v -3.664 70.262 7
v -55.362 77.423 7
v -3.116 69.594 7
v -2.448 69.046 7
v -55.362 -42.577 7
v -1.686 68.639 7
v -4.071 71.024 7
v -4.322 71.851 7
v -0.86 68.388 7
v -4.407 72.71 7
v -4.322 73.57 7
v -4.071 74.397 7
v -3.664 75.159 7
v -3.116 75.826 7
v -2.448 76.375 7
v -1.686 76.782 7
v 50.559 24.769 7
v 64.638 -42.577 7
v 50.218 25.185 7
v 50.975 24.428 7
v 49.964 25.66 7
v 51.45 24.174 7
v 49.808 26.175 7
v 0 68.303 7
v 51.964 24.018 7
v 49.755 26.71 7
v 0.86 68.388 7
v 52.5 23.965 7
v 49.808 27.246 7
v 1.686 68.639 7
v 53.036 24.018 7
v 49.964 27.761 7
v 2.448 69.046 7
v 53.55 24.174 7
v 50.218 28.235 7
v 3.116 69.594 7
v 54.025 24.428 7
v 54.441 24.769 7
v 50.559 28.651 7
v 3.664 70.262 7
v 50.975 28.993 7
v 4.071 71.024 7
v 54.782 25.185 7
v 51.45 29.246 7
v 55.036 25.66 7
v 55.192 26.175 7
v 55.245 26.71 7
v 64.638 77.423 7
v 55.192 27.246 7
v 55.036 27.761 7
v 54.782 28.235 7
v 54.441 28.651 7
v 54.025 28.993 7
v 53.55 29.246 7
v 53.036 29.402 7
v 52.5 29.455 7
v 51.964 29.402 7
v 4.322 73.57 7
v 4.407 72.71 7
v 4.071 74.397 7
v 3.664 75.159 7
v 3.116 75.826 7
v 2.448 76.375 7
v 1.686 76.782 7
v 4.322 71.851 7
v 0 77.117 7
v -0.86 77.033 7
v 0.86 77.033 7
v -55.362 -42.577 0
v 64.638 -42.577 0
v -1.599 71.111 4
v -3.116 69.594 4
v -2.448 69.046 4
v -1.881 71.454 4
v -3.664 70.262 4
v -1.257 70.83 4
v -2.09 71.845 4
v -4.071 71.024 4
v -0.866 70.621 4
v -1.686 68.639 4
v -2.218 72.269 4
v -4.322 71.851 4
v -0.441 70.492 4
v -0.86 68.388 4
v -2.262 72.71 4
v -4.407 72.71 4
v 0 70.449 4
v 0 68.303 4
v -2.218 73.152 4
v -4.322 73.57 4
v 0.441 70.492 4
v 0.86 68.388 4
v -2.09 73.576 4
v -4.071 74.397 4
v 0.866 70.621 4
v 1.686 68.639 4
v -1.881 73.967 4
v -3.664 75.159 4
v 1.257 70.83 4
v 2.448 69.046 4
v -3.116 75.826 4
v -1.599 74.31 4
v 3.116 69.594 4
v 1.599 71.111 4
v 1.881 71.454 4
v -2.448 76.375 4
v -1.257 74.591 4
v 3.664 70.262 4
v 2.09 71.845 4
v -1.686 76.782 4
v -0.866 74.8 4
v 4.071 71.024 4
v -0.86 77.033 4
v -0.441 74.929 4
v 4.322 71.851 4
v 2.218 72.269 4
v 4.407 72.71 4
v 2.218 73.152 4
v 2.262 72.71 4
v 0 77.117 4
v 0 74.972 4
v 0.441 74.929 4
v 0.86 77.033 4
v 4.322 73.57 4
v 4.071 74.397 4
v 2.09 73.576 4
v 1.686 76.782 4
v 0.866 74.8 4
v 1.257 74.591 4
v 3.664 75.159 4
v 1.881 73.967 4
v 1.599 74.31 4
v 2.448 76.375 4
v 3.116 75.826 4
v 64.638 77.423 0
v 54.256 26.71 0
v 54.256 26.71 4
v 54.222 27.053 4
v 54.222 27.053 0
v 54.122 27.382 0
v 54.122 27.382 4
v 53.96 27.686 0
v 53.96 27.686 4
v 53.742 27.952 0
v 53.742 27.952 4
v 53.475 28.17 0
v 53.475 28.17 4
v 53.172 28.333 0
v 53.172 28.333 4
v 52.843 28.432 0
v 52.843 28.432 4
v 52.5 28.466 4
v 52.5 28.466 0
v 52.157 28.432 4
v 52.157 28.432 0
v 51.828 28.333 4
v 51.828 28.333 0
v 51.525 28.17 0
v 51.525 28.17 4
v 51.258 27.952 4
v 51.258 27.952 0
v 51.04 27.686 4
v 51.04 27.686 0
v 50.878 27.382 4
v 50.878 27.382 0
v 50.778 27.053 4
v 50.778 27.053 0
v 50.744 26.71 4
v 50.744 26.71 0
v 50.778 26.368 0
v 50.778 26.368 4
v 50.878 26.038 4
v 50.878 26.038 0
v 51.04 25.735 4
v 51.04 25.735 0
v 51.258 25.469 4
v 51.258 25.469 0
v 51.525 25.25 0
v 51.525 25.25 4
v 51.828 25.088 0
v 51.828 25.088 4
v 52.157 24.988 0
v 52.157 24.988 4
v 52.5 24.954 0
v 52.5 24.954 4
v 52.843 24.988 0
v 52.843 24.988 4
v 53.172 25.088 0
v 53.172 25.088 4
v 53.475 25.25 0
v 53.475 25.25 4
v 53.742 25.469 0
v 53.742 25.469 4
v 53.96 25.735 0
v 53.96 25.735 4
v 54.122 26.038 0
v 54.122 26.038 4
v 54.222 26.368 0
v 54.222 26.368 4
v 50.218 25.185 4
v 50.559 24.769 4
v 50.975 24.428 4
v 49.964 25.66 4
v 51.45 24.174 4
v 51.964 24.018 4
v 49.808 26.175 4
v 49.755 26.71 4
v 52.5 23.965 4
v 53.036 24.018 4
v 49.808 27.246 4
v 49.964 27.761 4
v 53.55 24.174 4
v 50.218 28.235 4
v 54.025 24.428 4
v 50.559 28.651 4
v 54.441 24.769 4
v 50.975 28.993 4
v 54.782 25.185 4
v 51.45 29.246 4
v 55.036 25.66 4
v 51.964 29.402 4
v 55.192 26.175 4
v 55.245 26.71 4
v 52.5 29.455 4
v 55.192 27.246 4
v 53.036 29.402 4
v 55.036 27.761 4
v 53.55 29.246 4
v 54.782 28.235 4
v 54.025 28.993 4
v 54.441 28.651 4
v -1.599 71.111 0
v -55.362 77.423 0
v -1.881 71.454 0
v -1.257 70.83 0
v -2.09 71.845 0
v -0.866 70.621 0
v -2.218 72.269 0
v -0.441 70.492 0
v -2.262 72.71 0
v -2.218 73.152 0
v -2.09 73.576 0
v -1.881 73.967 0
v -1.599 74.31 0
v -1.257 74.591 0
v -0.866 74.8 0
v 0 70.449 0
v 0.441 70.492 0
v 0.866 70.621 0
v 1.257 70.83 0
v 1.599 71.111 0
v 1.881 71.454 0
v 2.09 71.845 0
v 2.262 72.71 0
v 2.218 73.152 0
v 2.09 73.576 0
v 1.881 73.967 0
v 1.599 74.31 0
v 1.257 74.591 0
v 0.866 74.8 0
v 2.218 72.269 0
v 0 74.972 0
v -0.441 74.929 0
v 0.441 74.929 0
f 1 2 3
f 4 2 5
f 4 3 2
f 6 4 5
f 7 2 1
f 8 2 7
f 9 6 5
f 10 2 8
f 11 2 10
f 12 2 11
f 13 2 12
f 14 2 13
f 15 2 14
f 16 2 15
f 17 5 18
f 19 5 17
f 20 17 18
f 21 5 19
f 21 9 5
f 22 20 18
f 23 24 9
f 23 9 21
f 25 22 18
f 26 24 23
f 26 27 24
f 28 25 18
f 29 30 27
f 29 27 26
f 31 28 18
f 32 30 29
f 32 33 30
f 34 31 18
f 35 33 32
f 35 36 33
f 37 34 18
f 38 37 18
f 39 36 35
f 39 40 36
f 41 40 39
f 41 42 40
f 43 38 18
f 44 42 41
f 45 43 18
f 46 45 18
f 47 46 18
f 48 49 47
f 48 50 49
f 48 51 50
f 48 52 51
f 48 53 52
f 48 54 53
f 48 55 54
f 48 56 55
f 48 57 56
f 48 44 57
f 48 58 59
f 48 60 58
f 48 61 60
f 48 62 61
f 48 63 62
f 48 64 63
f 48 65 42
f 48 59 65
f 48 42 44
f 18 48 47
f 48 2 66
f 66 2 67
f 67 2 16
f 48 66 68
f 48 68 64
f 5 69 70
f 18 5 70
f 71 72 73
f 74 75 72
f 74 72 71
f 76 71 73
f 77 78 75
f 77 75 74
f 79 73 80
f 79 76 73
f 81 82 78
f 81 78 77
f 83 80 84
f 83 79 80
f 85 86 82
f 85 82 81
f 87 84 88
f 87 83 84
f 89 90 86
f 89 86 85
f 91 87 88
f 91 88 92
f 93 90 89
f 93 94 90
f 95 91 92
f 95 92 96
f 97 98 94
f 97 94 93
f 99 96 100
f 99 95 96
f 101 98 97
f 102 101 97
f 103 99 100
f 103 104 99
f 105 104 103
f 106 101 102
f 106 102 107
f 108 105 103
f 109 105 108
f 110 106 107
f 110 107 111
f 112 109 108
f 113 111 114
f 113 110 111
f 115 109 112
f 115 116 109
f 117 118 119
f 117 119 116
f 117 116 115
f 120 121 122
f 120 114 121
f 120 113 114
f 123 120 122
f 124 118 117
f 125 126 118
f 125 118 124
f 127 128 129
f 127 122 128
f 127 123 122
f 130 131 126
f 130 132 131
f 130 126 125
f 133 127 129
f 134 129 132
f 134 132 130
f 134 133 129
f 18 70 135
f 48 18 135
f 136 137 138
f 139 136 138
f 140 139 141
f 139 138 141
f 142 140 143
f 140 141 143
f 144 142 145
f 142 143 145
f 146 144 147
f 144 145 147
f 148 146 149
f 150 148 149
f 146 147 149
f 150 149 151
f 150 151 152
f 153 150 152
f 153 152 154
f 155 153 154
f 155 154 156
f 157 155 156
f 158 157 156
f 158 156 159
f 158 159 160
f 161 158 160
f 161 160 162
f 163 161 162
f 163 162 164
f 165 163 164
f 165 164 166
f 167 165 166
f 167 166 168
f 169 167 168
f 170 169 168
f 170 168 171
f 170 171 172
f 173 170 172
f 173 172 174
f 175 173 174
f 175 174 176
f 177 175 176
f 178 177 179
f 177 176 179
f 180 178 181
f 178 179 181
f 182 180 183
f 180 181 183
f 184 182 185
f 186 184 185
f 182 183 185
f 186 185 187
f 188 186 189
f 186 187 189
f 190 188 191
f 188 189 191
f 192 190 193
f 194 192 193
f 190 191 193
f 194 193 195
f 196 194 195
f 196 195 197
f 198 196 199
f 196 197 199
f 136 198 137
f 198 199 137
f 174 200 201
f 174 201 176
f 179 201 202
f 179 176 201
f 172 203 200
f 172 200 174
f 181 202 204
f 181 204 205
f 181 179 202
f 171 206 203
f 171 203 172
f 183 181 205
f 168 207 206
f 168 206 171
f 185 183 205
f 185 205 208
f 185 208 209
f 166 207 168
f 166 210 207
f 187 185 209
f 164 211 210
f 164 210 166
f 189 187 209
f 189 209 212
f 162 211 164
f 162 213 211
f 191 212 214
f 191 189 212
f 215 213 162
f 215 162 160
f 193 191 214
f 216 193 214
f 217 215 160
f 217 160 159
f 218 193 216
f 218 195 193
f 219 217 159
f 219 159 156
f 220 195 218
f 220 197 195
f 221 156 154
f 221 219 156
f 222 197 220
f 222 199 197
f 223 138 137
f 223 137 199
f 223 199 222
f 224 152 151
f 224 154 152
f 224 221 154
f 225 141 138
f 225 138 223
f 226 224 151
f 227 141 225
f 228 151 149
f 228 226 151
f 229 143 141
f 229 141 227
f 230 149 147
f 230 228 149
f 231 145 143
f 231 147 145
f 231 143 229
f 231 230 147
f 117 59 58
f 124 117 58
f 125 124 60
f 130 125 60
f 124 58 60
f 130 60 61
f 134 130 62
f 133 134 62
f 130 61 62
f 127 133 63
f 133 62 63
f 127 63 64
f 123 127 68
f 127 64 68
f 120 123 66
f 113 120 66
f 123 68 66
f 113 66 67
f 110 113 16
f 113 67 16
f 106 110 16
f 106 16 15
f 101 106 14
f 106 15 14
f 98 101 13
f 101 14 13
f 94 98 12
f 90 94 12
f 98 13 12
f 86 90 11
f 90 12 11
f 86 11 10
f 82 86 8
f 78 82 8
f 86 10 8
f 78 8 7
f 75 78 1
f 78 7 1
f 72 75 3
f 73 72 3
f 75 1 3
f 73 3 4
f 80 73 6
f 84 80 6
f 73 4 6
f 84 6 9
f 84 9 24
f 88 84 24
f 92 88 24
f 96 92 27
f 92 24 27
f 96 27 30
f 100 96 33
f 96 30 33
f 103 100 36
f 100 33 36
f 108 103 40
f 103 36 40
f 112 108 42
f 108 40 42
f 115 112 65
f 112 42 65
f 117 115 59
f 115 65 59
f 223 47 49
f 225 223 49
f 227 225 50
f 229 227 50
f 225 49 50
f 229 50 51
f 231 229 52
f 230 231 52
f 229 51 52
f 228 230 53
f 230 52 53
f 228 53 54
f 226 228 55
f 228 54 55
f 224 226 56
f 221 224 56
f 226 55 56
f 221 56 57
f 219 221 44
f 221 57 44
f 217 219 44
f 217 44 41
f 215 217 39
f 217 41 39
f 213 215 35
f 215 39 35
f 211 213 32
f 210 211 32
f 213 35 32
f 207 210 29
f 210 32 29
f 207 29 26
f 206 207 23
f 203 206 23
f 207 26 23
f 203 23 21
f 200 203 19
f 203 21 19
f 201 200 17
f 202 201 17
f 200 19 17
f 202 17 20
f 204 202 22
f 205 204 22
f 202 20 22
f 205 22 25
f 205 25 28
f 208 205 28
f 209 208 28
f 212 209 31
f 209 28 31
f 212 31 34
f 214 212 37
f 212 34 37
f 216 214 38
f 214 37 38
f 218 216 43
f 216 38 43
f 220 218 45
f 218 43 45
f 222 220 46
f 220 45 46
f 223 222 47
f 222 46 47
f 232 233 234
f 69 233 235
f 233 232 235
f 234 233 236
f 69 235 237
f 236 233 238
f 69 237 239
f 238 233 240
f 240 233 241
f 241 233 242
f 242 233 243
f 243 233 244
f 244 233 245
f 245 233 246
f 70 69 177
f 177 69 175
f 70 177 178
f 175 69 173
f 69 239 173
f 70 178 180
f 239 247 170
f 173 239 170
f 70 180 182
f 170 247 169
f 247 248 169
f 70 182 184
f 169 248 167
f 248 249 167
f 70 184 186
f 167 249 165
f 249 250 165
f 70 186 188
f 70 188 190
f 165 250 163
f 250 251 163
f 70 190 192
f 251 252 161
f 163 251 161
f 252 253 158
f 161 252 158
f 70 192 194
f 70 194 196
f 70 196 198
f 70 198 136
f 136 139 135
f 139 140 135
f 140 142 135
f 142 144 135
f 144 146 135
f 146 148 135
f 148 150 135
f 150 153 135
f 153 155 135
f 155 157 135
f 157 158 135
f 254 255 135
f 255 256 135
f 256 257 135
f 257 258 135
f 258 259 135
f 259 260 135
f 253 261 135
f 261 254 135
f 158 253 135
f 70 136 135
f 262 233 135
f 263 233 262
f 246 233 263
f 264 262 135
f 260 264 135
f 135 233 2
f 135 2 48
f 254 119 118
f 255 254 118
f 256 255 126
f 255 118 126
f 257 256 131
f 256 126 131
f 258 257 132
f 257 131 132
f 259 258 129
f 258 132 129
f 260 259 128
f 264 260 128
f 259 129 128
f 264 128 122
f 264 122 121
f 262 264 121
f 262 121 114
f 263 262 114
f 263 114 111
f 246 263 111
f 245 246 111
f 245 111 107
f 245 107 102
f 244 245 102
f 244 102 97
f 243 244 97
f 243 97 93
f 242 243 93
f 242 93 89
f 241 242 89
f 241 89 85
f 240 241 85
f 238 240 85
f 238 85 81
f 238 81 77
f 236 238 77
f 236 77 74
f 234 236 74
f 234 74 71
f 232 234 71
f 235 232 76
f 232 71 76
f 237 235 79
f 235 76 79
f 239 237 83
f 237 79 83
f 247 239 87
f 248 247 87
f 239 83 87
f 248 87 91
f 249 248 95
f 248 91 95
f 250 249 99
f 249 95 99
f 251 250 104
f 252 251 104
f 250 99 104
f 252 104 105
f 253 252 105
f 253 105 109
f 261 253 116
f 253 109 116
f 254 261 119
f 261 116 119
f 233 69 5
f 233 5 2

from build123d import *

# Parameters (mm, degrees)
SKETCH_5_W          = 120
SKETCH_5_H          = 120
EXTRUDE_2_DEPTH     = 7
SKETCH_6_R          = 2.261709603
CUT_EXTRUDE_1_DEPTH = 7
SKETCH_9_R          = 4.406880206
CUT_EXTRUDE_2_DEPTH = 3
SKETCH_10_R         = 1.755844697
CUT_EXTRUDE_3_DEPTH = 7
SKETCH_11_R         = 2.744907592
CUT_EXTRUDE_4_DEPTH = 3


with BuildPart() as part:
    # 草图5 → 凸台-拉伸2 (new body)
    with BuildSketch(Plane.XY):
        with Locations((4.638432047, 17.423222422)):
            Rectangle(SKETCH_5_W, SKETCH_5_H)
    extrude(amount=EXTRUDE_2_DEPTH)

    # 草图6 → 切除-拉伸1 (cut)
    with BuildSketch(Plane.XY.offset(7)):
        with Locations((0, 72.710313561)):
            Circle(SKETCH_6_R)
    extrude(amount=-CUT_EXTRUDE_1_DEPTH, mode=Mode.SUBTRACT)

    # 草图9 → 切除-拉伸2 (cut)
    with BuildSketch(Plane.XY.offset(7)):
        with Locations((0, 72.710313561)):
            Circle(SKETCH_9_R)
    extrude(amount=-CUT_EXTRUDE_2_DEPTH, mode=Mode.SUBTRACT)

    # 草图10 → 切除-拉伸3 (cut)
    with BuildSketch(Plane.XY.offset(7)):
        with Locations((52.5, 26.710313561)):
            Circle(SKETCH_10_R)
    extrude(amount=-CUT_EXTRUDE_3_DEPTH, mode=Mode.SUBTRACT)

    # 草图11 → 切除-拉伸4 (cut)
    with BuildSketch(Plane.XY.offset(7)):
        with Locations((52.5, 26.710313561)):
            Circle(SKETCH_11_R)
    extrude(amount=-CUT_EXTRUDE_4_DEPTH, mode=Mode.SUBTRACT)


solid = part.part
